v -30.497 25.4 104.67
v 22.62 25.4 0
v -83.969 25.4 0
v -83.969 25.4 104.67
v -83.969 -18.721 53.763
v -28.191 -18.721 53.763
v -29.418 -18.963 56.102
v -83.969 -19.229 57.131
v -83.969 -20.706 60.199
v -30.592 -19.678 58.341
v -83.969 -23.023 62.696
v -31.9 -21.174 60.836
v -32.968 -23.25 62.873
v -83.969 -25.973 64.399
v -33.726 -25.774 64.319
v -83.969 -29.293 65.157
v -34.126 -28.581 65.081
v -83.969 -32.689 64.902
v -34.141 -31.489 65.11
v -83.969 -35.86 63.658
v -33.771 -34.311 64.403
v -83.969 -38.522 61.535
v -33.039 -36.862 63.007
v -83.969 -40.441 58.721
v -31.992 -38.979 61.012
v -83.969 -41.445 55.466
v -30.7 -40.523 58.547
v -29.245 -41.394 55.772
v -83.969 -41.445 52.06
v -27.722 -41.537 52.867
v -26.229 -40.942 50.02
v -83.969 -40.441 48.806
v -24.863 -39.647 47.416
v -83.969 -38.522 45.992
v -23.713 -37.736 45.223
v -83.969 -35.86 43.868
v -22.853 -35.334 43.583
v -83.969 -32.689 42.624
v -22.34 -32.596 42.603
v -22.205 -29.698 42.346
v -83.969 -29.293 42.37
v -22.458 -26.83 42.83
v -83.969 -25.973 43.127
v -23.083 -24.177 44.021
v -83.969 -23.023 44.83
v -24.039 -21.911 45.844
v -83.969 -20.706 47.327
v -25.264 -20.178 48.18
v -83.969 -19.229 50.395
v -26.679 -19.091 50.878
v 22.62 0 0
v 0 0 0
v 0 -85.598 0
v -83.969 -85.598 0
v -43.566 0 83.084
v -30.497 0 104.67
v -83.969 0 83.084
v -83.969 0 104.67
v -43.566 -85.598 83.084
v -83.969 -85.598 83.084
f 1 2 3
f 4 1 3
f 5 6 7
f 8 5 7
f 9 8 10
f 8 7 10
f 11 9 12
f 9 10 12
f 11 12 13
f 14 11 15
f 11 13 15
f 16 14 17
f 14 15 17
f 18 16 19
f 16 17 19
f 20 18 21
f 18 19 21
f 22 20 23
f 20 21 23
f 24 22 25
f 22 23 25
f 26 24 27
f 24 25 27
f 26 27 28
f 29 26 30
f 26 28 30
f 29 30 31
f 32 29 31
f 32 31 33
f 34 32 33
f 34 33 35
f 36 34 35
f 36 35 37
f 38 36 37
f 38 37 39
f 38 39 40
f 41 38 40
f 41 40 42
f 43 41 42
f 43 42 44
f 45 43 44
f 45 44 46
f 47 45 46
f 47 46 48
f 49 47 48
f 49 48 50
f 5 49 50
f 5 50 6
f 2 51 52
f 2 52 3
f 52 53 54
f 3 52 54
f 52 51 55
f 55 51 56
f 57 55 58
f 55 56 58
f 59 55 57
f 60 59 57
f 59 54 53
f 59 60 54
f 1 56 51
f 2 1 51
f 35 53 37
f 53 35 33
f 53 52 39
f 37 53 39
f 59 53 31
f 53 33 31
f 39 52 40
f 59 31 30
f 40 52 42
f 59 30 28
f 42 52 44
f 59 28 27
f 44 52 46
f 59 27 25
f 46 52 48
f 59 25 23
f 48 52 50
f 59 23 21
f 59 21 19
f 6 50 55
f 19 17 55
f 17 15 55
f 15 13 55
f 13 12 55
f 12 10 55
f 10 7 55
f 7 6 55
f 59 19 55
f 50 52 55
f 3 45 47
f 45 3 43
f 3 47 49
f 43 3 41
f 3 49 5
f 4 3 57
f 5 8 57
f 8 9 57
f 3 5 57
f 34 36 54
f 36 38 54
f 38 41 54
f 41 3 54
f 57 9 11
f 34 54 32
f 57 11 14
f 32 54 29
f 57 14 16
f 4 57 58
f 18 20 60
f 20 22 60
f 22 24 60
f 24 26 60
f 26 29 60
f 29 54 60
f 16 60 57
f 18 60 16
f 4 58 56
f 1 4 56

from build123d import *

# Parameters (mm, degrees)
F1_DEPTH = 85.598
F3_DEPTH = 25.4
F4_R     = 11.425588
F5_DEPTH = 83.969714


with BuildPart() as f1:
    # F0 (on Front) → F1 (new body)
    with BuildSketch(Plane.XZ):
        Polygon((-83.968714, 0), (0, 0), (-43.566376, 83.084151), (-83.968714, 83.084151), align=None)
    extrude(amount=F1_DEPTH)

    # F2 (on face) → F3 (join)
    with BuildSketch(Plane(origin=(0, 0, 0), x_dir=(-1, 0, 0), z_dir=(0, 1, 0))):
        Polygon((-22.619896, 0), (83.968714, 0), (83.968714, 104.670398), (30.496623, 104.670398), align=None)
    extrude(amount=F3_DEPTH)

    # F4 (on Right) → F5 (cut, through all)
    with BuildSketch(Plane.YZ):
        with Locations((-30.146739, 53.763162)):
            Circle(F4_R)
    extrude(amount=-F5_DEPTH, mode=Mode.SUBTRACT)


solid = f1.part
